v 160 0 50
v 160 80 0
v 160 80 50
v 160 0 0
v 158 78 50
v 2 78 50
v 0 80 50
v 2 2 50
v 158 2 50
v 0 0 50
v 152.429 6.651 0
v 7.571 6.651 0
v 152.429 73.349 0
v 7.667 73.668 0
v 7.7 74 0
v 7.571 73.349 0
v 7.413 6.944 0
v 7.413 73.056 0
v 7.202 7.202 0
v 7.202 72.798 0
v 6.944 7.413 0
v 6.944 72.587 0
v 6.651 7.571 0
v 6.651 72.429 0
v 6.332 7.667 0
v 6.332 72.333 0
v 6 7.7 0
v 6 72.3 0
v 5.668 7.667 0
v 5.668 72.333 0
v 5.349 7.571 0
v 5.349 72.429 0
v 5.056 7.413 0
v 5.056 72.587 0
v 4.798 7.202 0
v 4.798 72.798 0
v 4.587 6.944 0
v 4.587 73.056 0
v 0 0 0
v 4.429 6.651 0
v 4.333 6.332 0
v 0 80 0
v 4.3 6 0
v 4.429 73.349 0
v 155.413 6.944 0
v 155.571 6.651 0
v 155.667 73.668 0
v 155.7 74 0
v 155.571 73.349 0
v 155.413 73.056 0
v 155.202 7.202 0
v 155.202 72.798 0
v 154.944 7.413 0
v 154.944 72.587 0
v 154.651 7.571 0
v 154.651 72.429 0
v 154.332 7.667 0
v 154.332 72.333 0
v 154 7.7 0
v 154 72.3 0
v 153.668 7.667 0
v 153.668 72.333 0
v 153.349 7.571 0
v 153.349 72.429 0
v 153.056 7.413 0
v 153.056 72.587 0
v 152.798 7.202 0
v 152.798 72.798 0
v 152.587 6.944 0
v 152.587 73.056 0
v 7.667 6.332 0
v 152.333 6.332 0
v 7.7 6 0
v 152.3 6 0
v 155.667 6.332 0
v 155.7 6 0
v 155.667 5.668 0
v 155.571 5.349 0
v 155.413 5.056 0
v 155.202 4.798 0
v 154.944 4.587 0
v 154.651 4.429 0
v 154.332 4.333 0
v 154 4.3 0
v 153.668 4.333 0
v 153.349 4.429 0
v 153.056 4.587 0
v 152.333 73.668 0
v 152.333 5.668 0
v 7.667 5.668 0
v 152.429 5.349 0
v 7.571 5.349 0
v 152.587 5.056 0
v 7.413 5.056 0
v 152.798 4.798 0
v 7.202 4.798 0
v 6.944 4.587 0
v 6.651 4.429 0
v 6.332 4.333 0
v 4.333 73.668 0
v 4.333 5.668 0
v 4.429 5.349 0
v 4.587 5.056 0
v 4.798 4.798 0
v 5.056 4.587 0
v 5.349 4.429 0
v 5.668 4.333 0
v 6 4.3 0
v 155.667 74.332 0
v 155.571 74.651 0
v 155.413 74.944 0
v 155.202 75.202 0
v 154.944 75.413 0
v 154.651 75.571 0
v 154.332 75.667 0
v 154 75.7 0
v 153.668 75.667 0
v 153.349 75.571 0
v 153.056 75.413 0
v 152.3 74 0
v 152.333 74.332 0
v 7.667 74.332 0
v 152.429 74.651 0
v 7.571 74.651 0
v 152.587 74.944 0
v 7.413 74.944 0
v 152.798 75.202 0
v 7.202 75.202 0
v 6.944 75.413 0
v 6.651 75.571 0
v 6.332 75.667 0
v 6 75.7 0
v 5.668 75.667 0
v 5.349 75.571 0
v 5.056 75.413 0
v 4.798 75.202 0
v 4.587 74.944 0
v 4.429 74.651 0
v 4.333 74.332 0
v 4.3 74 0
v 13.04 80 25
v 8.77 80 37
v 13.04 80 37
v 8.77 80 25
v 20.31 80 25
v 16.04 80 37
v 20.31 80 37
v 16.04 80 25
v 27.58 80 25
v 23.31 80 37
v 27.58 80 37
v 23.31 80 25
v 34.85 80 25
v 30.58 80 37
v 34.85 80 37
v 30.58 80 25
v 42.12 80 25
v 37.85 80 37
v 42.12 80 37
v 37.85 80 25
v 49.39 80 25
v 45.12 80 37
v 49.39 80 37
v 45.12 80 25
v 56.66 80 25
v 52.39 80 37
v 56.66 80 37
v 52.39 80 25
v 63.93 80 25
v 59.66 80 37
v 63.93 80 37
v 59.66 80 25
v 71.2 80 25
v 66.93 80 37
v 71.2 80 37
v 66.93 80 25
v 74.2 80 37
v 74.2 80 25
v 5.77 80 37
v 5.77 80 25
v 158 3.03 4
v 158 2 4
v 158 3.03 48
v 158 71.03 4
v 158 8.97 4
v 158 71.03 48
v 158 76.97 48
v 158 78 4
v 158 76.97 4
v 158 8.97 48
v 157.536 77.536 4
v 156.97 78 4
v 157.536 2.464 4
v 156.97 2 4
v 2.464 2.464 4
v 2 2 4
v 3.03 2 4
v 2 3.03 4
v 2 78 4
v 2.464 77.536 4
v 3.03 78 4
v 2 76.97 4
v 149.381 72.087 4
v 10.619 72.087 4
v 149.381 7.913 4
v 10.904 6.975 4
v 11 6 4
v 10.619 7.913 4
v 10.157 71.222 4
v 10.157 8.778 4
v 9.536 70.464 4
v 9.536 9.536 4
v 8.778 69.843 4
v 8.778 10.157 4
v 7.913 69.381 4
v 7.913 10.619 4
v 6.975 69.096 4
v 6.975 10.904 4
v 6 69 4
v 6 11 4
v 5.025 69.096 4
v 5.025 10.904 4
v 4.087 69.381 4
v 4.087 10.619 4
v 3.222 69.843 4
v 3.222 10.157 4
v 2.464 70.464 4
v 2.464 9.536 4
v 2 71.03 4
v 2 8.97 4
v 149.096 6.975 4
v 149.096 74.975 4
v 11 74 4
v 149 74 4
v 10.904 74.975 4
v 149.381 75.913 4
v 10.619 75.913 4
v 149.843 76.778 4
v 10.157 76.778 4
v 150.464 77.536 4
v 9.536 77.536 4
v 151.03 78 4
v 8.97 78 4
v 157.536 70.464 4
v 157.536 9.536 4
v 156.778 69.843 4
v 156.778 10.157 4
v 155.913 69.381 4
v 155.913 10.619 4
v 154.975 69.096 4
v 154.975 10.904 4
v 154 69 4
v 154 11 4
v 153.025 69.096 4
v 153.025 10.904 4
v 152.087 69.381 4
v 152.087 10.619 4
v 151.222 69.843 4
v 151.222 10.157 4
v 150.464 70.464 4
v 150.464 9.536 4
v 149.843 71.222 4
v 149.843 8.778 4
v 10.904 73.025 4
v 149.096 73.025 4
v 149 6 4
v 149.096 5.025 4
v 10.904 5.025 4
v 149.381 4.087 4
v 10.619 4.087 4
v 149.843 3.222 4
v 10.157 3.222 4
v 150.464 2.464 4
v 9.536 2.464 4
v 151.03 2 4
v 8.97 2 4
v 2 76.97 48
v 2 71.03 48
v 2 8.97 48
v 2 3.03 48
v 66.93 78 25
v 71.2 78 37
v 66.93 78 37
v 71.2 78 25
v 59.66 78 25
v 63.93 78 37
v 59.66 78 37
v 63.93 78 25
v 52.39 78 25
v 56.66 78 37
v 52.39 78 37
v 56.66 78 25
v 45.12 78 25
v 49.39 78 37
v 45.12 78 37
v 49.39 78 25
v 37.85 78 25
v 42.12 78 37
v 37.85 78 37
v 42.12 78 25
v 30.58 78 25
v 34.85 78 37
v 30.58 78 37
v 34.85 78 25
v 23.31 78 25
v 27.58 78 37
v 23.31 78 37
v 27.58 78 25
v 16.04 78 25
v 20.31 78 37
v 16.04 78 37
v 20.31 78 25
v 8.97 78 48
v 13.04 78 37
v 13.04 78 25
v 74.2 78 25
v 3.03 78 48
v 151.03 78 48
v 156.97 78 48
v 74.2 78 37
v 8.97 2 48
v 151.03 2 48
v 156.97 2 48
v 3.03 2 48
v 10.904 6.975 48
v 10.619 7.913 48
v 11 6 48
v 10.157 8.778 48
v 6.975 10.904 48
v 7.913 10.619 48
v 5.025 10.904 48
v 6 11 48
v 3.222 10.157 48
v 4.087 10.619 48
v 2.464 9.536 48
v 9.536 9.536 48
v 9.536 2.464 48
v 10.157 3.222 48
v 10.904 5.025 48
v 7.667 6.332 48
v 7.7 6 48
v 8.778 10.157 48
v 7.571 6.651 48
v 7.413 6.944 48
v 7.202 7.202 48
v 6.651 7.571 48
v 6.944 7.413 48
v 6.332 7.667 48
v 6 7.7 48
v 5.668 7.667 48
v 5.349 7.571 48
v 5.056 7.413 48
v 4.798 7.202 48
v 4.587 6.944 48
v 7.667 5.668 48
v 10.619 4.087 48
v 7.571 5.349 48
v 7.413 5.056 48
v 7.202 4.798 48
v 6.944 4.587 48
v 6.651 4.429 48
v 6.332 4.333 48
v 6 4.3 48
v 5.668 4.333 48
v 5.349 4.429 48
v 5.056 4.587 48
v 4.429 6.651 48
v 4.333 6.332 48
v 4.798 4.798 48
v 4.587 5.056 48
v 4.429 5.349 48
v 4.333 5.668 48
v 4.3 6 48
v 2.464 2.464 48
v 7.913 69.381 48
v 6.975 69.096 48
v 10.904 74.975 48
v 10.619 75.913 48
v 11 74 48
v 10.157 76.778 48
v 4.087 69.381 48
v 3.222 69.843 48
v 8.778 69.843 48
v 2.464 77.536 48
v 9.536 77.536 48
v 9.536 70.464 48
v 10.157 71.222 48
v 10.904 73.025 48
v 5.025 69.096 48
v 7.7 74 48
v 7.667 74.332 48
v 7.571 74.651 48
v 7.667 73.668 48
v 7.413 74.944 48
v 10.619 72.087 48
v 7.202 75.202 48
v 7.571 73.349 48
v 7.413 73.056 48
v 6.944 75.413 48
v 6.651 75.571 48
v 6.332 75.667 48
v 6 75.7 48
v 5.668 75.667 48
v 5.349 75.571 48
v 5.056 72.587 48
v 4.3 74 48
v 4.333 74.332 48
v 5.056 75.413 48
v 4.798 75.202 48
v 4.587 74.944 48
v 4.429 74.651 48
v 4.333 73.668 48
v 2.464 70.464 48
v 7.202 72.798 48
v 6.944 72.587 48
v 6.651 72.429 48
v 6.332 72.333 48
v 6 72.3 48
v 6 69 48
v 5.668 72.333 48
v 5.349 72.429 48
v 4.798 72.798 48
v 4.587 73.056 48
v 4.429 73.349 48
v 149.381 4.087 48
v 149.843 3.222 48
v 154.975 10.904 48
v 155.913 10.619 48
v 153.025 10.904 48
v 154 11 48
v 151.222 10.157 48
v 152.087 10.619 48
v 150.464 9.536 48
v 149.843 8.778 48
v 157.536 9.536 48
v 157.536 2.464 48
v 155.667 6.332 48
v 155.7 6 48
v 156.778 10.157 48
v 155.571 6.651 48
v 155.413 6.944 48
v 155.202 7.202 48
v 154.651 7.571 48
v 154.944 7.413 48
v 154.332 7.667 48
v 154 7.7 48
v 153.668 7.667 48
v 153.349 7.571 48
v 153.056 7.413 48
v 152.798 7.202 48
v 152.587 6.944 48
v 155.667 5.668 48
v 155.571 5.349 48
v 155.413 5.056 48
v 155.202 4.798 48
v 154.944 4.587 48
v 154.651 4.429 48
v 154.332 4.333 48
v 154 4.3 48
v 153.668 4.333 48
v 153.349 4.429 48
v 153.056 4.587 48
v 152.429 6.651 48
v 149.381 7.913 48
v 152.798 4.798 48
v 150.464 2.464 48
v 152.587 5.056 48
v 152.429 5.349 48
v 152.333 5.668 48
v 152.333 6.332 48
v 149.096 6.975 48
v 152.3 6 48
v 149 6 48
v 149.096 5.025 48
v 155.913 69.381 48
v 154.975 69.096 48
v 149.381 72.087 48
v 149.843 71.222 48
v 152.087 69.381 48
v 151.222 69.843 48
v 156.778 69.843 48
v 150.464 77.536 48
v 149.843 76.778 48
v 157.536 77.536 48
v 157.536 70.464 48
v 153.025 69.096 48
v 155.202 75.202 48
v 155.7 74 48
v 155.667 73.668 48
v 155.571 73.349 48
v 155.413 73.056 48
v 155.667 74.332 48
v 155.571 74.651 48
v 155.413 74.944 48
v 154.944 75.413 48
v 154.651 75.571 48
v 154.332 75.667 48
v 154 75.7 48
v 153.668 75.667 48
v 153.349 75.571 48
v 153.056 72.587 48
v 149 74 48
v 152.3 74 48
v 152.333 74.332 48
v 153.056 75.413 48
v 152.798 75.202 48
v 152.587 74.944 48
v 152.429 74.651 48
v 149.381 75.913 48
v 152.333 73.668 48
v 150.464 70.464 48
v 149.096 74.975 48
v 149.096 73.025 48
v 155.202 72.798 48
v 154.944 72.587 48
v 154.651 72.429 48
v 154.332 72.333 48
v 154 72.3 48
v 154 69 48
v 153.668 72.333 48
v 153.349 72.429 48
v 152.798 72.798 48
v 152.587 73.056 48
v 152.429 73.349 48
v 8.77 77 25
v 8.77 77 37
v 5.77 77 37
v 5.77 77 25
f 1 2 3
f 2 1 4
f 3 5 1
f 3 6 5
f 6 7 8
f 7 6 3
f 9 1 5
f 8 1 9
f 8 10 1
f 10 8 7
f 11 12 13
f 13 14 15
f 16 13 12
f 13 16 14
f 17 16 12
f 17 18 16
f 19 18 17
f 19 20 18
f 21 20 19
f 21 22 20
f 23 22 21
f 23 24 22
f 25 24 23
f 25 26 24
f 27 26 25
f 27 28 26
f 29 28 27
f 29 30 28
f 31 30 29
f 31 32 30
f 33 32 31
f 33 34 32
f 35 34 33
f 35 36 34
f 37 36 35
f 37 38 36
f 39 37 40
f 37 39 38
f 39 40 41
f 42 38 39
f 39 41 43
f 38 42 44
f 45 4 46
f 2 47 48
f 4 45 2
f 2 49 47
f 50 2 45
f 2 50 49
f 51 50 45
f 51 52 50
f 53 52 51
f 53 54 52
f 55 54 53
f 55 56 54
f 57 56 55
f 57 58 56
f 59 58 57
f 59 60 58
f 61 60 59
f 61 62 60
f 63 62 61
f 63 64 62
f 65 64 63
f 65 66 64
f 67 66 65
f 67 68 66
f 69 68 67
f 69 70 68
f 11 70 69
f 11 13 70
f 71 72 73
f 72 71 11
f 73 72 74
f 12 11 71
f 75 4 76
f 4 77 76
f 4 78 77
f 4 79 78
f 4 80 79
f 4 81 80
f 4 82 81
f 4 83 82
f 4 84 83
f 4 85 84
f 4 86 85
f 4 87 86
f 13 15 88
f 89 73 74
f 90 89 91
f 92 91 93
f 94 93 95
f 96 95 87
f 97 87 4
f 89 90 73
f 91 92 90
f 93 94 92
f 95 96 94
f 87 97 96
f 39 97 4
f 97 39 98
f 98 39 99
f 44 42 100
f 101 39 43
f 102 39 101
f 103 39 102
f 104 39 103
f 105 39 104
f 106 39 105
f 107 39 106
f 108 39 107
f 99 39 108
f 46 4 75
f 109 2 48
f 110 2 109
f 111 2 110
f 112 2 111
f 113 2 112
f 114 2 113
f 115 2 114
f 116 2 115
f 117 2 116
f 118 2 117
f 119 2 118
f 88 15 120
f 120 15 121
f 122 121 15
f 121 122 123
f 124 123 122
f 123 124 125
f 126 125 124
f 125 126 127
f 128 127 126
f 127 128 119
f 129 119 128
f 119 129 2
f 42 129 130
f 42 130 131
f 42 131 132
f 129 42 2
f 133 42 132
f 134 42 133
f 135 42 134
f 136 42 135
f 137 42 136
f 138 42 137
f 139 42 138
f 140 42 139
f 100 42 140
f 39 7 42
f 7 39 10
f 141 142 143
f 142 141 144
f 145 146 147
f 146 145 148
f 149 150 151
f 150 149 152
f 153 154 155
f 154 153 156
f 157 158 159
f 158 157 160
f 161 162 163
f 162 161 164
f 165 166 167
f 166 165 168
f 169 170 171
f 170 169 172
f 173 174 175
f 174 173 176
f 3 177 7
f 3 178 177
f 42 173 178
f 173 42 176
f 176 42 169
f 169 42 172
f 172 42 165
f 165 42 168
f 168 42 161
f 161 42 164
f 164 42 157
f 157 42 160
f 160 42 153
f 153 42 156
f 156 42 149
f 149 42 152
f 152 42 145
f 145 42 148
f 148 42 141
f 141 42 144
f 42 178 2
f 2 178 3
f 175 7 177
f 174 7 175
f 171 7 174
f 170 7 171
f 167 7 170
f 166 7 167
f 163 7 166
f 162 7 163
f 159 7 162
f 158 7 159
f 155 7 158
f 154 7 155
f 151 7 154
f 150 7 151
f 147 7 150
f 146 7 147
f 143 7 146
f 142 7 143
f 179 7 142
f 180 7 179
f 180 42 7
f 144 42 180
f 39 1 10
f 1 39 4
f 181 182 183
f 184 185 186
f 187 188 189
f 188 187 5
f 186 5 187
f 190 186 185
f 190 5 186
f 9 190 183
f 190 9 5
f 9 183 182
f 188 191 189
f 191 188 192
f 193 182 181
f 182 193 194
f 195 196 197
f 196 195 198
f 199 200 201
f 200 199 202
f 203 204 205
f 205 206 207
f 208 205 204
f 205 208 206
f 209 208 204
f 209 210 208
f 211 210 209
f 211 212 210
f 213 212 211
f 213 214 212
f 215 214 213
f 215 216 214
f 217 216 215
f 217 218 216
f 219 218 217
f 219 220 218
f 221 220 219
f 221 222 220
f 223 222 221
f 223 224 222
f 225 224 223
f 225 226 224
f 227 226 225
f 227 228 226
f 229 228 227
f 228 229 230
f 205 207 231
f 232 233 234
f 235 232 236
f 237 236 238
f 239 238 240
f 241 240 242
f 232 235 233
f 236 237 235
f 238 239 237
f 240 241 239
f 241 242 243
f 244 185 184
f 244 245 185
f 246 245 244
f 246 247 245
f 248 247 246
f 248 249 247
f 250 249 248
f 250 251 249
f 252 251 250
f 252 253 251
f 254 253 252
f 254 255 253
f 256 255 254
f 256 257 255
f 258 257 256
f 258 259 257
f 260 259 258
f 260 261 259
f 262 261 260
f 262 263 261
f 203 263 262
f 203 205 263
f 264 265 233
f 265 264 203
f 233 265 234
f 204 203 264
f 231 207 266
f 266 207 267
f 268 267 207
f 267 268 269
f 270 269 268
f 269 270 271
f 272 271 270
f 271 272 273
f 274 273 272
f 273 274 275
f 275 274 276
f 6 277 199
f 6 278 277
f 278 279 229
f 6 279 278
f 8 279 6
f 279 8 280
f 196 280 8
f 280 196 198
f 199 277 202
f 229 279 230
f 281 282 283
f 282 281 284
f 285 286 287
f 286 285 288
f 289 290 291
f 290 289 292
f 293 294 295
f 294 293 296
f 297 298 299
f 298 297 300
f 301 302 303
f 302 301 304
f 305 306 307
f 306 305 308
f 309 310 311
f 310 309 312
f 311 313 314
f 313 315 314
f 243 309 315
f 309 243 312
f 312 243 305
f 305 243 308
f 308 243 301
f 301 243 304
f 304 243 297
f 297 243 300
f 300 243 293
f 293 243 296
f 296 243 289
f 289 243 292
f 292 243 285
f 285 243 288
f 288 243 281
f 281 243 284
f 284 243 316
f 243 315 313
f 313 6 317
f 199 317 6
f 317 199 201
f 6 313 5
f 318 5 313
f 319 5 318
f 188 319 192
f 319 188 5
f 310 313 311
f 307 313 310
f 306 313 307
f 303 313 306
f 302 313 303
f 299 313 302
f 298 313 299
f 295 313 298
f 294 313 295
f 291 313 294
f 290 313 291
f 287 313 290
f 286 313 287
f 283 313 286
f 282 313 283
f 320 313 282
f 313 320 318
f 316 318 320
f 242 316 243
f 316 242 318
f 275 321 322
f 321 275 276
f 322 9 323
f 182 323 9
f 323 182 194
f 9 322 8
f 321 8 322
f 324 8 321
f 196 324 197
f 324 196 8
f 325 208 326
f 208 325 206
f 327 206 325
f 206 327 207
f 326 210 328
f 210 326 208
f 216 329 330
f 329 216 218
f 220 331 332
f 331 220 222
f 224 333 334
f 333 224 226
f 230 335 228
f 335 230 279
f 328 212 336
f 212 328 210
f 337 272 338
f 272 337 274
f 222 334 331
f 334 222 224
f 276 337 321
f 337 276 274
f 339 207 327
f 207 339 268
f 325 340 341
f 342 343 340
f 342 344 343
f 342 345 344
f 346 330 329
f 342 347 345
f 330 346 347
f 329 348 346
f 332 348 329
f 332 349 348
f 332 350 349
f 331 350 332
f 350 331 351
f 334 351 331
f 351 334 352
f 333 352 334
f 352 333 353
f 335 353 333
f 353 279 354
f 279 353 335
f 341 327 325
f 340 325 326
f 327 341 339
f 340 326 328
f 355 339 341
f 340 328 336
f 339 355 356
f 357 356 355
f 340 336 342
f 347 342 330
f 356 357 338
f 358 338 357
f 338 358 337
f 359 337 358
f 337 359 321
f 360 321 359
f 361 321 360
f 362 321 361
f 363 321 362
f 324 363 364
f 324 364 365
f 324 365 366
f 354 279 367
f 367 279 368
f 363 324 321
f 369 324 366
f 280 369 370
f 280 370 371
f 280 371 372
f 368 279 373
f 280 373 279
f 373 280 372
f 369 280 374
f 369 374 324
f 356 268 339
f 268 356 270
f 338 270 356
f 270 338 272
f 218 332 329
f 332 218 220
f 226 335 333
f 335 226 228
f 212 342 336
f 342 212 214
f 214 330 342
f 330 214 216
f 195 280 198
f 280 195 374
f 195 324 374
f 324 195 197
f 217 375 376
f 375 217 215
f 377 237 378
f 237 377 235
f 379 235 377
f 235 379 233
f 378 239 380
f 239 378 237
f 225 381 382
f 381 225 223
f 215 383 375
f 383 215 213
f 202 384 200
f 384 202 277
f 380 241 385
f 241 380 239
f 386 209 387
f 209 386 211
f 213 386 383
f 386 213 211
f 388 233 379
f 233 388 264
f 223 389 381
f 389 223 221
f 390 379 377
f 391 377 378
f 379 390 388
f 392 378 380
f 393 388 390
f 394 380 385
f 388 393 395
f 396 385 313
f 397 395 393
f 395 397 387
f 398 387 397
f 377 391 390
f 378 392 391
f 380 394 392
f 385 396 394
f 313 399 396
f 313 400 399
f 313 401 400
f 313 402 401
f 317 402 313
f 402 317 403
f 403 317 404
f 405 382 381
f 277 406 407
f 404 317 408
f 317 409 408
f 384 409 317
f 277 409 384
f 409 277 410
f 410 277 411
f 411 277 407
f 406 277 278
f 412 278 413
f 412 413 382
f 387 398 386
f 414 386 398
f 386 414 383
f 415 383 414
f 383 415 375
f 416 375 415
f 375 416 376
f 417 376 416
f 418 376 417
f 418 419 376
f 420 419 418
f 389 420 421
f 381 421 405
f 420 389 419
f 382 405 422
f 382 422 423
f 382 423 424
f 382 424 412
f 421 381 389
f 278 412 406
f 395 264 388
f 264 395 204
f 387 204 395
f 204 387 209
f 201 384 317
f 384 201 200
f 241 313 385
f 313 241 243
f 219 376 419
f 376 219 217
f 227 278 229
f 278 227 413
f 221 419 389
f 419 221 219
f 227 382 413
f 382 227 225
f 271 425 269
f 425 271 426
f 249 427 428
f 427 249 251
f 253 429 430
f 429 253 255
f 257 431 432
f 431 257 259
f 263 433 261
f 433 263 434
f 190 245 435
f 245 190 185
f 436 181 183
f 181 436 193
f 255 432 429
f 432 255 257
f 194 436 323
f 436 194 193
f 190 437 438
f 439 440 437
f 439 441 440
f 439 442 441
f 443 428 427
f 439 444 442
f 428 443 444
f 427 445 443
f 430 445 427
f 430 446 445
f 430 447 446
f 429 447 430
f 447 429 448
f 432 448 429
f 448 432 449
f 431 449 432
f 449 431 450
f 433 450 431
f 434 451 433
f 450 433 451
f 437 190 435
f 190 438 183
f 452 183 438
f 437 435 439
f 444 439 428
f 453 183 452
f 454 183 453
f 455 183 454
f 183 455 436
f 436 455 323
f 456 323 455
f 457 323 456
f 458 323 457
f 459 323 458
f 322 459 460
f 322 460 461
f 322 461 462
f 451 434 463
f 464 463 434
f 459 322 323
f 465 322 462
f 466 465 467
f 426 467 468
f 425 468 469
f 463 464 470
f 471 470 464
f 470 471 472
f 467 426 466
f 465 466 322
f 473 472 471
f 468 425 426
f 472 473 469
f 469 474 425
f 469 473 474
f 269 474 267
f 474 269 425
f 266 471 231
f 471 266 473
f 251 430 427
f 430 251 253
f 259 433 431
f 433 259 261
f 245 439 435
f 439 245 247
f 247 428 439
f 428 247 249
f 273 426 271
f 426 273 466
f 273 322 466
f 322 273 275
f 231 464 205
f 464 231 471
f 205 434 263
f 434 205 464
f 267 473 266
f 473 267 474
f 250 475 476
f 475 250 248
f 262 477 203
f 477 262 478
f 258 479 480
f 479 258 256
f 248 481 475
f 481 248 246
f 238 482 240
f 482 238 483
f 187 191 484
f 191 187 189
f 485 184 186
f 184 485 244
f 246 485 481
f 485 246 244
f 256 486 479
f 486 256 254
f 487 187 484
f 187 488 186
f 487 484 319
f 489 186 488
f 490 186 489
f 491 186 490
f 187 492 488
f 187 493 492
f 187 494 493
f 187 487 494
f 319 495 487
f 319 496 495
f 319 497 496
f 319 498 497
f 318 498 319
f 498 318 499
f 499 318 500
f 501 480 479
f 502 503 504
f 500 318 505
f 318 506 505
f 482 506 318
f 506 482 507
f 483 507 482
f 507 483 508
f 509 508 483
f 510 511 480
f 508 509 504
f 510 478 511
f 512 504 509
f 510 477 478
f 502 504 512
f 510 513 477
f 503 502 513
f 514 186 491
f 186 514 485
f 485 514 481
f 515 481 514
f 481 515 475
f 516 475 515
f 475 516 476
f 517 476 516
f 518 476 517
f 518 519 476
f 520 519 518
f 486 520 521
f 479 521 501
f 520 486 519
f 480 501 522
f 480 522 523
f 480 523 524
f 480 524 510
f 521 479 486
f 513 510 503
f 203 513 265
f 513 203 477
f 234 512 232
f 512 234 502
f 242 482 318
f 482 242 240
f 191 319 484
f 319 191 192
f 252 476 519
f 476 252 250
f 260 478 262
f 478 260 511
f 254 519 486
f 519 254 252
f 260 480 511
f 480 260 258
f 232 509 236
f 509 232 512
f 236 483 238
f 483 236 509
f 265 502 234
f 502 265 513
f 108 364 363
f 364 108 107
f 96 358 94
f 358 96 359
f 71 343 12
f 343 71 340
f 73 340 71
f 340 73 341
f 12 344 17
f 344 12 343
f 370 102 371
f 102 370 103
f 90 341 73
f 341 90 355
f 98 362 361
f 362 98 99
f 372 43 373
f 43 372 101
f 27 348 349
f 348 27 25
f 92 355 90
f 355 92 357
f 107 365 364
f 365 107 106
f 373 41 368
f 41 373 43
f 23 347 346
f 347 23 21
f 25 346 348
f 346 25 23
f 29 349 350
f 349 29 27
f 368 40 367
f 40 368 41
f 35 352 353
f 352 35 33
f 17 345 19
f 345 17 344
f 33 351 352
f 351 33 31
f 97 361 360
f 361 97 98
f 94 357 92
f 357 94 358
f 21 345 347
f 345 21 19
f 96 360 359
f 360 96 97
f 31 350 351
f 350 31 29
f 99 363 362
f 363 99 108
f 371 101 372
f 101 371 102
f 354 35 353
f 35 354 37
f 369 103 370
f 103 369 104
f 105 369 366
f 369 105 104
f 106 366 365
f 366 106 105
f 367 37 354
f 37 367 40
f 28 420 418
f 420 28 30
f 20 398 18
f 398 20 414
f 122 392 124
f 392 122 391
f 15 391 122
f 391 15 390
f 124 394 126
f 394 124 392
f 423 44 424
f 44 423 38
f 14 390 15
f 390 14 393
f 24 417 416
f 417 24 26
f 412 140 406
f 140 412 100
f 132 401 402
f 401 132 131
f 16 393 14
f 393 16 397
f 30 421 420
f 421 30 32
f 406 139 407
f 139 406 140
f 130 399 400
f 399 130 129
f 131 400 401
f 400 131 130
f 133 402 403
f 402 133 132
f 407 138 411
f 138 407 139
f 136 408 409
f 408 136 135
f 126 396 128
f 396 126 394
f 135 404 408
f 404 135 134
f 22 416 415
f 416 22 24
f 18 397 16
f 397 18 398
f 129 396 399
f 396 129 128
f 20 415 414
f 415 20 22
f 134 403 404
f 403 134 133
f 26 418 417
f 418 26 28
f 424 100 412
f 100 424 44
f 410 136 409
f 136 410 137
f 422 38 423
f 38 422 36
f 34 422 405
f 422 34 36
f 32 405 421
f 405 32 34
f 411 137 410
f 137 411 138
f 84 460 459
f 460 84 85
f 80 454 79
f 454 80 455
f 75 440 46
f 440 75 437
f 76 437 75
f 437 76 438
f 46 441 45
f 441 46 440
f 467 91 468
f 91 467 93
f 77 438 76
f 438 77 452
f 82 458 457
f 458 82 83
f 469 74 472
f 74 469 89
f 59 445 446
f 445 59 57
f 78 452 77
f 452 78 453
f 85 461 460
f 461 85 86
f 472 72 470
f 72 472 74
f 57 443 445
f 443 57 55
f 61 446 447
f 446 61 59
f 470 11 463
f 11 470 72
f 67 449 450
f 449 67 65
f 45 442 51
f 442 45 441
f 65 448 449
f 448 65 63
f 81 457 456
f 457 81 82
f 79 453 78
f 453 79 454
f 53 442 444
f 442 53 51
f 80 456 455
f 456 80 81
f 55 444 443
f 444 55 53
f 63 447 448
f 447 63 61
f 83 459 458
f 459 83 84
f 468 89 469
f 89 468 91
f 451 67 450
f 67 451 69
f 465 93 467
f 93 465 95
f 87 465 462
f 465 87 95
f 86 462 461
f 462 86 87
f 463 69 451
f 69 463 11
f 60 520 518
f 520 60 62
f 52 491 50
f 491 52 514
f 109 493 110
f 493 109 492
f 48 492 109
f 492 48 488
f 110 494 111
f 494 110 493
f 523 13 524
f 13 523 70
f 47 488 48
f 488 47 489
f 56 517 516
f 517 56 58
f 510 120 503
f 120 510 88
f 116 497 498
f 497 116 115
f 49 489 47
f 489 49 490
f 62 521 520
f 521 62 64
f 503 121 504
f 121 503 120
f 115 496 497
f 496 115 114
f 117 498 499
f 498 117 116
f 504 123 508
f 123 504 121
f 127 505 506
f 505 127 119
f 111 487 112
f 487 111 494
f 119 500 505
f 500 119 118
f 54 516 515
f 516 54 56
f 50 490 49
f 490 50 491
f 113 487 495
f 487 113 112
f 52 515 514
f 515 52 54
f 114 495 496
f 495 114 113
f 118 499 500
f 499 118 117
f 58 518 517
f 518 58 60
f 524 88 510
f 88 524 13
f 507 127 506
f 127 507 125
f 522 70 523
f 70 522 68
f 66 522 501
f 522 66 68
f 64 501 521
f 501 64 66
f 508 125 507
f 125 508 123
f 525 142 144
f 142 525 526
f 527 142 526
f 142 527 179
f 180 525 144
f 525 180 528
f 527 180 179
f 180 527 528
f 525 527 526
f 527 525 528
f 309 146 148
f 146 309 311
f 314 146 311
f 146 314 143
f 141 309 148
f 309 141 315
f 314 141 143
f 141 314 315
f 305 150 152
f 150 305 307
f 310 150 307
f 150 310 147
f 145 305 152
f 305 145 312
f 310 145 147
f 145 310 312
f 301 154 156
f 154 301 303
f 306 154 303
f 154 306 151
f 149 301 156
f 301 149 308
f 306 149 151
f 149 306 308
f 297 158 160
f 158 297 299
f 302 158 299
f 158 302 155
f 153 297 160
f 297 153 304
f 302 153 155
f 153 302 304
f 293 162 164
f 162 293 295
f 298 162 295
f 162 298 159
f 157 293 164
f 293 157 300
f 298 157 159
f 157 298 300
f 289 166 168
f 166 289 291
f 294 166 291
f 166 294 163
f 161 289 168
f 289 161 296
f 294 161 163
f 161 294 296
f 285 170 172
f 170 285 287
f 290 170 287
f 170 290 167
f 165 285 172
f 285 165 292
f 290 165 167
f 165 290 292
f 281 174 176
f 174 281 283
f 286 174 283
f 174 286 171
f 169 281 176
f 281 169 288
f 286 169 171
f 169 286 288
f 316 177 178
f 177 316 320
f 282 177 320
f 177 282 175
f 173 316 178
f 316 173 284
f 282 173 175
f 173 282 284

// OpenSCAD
$fn = 32;

// ----------------------------------------------------------------------
// Enclosure body: 160 x 80 x 50 mm, wall 2 mm
// ----------------------------------------------------------------------

// --- parameters (mm) ---
length = 160;             // outside length, X
width = 80;               // outside width, Y
height = 50;              // outside height, Z
wall = 2;                 // side wall thickness
floor_t = 4;              // floor thickness
boss_d = 10;              // corner boss diameter
boss_h = 44;              // corner boss height above the floor
boss_hole_d = 3.4;        // lid screw clearance in the boss
boss_lip = 6;             // boss centre inset from the corner
vent_slots = 10;          // vent slots in the long wall
vent_w = 3;               // vent slot width
vent_h = 12;              // vent slot height
vent_pitch = 7.27;        // vent slot pitch
vent_z = 25;              // vent slot sill height

module shell() {
  difference() {
    cube([length, width, height]);
    /* hollow, open at the top */
    translate([wall, wall, floor_t])
      cube([length - 2 * wall, width - 2 * wall, height]);
  }
}

module bosses() {
  /* corner bosses, sunk 1 mm into the floor */
  for (sx = [0, 1]) for (sy = [0, 1])
    translate([sx * (length - 2 * boss_lip) + boss_lip, sy * (width - 2 * boss_lip) + boss_lip, floor_t - 1])
      cylinder(h = boss_h + 1, d = boss_d);
}

difference() {
  union() {
    shell();
    bosses();
  }
  /* boss screw holes */
  for (sx = [0, 1]) for (sy = [0, 1])
    translate([sx * (length - 2 * boss_lip) + boss_lip, sy * (width - 2 * boss_lip) + boss_lip, -1]) cylinder(h = floor_t + boss_h + 2, d = boss_hole_d);
  /* vent grille in the +Y wall */
  for (i = [0 : vent_slots - 1]) translate([vent_pitch * (i + 1) - vent_w / 2, width - wall - 1, vent_z]) cube([vent_w, wall + 2, vent_h]);
}
